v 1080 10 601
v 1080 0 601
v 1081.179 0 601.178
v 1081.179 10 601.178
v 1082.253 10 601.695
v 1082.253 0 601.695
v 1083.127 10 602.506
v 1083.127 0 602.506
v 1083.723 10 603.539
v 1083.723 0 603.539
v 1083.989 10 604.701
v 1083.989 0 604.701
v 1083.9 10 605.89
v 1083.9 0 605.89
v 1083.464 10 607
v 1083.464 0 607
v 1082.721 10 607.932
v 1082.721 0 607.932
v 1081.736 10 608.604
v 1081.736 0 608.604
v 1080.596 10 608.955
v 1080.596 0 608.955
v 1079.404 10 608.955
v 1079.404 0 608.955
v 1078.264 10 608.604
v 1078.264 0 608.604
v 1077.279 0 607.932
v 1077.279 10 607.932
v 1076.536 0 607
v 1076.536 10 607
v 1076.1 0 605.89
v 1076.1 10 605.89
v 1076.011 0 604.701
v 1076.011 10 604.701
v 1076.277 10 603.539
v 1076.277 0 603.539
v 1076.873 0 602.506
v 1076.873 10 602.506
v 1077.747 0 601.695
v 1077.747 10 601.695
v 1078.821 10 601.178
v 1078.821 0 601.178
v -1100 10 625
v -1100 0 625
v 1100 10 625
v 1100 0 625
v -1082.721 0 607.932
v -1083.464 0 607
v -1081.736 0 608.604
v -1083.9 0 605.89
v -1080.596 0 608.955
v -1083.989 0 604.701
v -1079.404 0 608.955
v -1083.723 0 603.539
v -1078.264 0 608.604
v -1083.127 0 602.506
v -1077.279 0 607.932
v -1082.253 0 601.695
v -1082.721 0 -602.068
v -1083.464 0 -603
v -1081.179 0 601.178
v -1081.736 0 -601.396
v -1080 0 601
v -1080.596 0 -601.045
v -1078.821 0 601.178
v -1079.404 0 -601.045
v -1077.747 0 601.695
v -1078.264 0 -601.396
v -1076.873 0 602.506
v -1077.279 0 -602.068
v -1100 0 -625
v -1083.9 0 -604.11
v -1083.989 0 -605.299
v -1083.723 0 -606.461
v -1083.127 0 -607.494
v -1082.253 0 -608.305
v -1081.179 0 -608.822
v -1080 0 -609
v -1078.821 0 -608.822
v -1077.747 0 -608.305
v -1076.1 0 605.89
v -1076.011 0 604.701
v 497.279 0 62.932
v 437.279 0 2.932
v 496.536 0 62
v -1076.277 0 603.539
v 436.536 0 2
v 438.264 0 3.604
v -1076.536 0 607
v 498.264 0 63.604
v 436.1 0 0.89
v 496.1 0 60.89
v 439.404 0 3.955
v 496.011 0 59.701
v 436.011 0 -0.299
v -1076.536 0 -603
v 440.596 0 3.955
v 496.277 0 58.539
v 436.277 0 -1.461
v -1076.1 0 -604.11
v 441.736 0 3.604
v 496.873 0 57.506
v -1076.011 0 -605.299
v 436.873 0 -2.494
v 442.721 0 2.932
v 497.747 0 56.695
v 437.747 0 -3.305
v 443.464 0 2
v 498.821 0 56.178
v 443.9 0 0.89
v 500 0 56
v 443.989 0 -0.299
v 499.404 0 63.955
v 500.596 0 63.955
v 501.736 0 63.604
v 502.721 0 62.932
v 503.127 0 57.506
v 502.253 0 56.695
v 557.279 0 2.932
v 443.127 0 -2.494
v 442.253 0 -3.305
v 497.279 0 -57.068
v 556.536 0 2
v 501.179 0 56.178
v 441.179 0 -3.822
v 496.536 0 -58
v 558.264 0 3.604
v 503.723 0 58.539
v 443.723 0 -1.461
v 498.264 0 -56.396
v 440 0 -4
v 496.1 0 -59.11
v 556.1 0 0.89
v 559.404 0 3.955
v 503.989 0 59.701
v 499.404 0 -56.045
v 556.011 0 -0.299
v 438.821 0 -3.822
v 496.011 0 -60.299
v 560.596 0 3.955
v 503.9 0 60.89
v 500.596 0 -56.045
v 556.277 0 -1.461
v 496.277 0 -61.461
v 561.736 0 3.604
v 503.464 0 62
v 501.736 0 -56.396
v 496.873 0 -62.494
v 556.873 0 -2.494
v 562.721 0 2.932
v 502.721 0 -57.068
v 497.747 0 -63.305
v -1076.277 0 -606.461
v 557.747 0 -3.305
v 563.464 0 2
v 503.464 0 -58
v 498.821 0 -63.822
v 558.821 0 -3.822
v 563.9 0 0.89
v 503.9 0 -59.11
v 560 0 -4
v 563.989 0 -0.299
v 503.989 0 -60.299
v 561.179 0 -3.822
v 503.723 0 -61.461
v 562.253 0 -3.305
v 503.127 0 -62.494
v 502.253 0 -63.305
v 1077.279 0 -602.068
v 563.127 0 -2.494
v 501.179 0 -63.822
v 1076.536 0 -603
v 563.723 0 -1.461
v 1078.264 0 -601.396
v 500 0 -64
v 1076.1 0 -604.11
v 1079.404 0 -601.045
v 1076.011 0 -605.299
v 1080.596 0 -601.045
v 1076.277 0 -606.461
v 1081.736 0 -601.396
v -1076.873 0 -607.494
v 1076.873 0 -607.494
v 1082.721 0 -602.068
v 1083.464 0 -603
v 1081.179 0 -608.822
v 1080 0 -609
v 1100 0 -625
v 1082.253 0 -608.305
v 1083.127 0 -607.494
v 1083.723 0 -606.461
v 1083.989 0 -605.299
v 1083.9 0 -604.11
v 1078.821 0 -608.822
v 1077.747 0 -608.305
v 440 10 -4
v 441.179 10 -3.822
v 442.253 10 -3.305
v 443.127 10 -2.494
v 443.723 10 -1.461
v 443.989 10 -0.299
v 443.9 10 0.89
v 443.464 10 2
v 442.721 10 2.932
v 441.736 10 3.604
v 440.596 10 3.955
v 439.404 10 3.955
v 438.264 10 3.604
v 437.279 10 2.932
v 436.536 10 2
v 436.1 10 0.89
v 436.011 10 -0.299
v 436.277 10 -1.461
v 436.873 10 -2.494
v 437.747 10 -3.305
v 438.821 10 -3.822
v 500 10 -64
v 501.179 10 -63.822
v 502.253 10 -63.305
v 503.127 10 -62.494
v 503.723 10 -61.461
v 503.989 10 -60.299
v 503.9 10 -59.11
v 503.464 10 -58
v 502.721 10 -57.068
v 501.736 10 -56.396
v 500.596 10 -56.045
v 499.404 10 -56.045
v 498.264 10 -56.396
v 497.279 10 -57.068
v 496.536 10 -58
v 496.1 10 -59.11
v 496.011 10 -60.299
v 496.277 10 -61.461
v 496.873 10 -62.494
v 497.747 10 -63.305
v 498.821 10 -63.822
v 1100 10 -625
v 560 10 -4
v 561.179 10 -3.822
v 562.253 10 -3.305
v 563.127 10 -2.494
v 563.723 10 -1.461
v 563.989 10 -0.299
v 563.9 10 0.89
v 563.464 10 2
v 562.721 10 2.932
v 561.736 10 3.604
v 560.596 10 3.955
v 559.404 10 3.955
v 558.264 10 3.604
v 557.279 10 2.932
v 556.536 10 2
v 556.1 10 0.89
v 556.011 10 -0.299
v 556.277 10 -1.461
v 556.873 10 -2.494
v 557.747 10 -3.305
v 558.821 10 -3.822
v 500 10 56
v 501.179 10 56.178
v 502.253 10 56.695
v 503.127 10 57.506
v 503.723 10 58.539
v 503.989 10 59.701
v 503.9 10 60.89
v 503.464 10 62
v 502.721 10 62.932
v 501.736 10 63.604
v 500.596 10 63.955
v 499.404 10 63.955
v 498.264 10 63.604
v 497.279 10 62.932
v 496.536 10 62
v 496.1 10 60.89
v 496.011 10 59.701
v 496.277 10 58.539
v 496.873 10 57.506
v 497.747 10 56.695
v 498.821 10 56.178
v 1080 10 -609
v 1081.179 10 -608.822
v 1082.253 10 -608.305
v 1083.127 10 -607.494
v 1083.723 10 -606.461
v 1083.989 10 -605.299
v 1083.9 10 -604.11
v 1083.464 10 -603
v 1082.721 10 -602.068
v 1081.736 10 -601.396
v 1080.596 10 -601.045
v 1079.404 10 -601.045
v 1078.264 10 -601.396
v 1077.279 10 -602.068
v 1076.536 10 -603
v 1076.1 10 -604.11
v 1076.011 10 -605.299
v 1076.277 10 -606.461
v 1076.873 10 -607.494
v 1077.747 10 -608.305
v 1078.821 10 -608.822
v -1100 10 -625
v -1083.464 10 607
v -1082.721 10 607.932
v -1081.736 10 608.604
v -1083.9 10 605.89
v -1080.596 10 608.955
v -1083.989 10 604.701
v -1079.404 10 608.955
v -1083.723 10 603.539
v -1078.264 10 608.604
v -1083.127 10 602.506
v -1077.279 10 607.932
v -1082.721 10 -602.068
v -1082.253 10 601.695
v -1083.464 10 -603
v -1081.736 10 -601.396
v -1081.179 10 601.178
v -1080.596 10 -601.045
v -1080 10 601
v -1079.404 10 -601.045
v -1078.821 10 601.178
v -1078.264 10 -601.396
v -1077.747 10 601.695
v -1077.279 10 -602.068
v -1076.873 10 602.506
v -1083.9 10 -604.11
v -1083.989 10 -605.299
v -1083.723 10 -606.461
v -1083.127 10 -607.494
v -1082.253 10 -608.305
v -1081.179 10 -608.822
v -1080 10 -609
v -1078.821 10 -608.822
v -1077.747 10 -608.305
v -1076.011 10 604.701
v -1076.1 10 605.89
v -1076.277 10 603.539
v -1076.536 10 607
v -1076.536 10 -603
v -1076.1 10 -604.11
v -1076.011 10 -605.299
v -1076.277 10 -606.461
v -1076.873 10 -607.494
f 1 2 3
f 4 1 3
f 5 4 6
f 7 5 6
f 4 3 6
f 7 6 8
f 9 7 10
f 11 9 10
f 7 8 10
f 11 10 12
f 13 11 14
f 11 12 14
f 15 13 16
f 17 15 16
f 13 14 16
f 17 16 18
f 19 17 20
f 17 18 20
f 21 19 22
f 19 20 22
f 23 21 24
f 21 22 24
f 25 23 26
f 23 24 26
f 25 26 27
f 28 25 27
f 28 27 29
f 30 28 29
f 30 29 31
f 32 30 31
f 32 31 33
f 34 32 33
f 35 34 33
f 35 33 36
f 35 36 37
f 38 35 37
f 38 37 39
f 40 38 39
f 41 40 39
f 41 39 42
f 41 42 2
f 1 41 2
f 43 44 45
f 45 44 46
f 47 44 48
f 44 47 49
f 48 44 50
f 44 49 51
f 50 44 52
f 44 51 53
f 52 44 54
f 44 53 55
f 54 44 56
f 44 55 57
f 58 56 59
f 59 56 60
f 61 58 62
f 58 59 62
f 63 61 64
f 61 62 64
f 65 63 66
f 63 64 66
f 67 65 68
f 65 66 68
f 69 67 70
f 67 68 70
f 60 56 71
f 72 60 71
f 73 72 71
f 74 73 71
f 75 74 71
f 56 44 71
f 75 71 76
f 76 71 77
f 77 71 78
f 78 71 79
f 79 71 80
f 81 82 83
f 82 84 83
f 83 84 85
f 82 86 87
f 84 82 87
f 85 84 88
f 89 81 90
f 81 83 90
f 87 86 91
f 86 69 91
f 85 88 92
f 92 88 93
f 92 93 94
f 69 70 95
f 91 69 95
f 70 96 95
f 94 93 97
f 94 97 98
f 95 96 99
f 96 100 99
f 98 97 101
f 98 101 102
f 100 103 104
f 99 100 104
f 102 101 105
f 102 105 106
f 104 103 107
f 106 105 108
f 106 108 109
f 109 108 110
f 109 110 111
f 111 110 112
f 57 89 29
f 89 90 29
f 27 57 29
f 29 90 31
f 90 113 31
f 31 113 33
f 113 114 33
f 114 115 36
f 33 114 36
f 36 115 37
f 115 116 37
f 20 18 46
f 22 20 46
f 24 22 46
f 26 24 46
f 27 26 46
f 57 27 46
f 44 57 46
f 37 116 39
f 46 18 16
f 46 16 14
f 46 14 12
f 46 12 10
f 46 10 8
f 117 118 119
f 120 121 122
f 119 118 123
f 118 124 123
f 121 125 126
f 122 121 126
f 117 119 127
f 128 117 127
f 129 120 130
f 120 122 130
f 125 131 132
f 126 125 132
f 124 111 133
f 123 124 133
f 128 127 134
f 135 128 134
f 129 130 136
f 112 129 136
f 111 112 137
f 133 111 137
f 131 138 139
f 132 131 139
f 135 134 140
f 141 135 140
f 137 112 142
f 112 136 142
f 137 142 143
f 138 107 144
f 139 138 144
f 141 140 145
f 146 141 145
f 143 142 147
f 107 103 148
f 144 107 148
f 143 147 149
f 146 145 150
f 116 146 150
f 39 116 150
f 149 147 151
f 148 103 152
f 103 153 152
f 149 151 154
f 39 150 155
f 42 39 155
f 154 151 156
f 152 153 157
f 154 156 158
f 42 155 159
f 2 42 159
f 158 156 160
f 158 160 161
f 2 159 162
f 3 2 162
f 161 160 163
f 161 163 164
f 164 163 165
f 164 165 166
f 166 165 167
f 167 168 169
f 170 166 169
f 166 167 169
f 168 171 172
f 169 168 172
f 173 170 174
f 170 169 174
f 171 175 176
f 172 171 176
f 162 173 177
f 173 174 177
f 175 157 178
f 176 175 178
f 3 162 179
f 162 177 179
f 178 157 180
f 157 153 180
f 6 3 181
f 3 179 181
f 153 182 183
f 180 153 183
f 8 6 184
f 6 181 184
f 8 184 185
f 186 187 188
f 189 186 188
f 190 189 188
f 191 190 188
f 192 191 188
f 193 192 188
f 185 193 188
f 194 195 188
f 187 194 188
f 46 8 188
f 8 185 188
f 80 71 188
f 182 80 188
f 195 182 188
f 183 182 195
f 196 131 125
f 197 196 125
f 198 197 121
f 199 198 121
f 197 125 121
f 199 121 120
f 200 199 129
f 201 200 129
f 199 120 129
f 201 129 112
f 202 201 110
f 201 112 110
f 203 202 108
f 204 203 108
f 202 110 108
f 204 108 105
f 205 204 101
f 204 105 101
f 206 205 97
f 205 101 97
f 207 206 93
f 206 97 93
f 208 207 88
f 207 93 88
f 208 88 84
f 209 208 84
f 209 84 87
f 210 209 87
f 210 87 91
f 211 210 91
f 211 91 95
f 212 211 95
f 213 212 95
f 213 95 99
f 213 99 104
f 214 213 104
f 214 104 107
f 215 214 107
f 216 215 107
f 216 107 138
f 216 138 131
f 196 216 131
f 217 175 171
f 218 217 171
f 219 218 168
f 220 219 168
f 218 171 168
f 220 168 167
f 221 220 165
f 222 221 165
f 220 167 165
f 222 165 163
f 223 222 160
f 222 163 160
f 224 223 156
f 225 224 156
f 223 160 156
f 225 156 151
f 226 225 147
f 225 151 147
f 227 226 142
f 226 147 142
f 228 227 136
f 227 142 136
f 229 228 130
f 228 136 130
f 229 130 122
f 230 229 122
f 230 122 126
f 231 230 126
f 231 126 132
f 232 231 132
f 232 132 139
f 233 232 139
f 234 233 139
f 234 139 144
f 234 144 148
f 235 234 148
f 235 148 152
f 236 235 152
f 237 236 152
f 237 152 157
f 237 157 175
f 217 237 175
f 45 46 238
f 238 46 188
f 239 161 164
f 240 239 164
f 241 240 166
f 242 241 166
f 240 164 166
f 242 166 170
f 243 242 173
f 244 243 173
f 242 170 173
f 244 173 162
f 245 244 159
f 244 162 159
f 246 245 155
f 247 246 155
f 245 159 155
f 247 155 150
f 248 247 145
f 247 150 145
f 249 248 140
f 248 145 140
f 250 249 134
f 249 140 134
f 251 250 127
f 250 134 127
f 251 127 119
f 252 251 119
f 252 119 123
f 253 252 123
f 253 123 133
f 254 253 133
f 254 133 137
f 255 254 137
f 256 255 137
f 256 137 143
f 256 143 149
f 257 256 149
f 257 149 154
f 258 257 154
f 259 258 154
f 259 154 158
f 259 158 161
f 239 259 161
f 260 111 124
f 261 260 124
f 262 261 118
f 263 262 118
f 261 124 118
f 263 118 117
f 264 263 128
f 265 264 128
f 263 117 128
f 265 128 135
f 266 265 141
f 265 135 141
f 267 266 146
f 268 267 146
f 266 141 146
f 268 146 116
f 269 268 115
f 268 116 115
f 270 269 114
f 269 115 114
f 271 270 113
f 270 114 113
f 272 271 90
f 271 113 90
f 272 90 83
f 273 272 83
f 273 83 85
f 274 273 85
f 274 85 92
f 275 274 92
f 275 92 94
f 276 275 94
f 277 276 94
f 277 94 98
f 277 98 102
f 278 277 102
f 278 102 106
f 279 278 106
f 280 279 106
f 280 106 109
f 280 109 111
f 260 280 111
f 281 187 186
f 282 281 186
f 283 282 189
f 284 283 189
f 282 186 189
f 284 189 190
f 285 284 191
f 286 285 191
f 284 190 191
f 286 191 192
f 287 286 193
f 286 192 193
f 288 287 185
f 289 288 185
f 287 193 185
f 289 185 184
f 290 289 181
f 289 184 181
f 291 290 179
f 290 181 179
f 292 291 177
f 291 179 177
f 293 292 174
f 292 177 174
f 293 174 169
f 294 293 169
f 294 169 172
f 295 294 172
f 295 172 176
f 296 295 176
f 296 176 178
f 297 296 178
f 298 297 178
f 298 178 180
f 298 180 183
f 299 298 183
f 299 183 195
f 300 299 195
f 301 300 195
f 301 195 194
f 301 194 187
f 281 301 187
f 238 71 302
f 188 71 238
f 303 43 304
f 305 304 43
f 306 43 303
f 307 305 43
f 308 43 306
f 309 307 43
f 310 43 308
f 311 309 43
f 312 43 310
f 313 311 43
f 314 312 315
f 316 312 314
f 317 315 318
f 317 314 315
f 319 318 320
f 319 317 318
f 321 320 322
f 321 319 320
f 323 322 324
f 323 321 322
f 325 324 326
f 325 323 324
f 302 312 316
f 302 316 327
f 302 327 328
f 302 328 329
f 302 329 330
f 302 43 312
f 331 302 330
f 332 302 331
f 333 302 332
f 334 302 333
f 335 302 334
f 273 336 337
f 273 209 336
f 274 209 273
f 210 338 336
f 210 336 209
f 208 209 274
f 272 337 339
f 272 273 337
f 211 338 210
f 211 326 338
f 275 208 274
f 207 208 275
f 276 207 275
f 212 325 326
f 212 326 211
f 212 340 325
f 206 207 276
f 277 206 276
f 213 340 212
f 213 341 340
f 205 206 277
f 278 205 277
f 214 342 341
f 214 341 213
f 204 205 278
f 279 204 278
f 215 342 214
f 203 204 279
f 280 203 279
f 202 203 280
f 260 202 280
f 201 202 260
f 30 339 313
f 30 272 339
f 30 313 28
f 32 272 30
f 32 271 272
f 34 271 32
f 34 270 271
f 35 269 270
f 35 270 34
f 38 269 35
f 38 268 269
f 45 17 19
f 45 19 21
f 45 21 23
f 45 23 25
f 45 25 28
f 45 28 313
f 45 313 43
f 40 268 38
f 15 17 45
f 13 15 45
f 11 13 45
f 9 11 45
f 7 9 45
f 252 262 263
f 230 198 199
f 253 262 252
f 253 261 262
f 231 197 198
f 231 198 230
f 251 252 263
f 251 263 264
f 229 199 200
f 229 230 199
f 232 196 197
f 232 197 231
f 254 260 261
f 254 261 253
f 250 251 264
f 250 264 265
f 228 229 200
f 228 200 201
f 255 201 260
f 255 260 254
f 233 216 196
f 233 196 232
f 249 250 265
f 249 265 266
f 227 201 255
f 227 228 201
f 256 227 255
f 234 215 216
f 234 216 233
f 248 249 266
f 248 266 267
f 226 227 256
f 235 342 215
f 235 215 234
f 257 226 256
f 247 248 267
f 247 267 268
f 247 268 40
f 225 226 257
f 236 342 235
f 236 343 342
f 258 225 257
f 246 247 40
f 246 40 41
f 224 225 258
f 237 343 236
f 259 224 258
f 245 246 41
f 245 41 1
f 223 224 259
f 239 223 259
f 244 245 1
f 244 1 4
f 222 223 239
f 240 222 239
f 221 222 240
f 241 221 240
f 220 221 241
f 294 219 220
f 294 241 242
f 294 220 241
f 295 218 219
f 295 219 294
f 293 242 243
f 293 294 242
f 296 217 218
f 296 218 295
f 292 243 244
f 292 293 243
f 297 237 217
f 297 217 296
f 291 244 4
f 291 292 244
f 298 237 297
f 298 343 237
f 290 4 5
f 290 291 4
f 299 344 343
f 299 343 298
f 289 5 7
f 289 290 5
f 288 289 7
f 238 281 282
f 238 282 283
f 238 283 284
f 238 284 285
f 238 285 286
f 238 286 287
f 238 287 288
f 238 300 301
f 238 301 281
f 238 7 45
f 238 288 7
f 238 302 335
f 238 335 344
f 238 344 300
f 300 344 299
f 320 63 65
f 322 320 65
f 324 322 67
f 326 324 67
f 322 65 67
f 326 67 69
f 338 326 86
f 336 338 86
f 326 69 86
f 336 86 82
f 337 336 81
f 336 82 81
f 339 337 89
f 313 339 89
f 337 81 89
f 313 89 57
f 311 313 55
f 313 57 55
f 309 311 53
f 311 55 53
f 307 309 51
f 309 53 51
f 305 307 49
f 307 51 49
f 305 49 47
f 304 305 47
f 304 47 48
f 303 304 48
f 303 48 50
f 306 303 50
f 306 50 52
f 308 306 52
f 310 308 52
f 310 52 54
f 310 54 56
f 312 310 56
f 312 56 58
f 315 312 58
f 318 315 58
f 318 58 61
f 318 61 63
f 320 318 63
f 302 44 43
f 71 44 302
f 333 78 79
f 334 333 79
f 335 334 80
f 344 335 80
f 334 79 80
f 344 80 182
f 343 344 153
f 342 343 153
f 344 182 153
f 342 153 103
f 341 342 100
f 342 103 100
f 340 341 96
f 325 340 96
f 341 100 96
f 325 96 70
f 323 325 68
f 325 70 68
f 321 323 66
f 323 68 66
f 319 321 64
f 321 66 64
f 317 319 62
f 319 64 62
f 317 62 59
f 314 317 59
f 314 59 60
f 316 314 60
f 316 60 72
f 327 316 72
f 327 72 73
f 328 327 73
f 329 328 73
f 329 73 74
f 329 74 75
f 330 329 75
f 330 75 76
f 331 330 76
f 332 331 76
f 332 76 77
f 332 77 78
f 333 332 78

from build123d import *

# Parameters (mm, degrees)
SKETCH_2_W      = 2200
SKETCH_2_H      = 1250
EXTRUDE_1_DEPTH = 10
MM_1_D          = 8
MM_1_DEPTH      = 20
MM_1_TIP        = 2.403442476
MM_2_D          = 8
MM_2_DEPTH      = 20
MM_2_TIP        = 2.403442476


with BuildPart() as part:
    # 草图2 → 凸台-拉伸1 (new body)
    with BuildSketch(Plane(origin=(0, 0, 0), x_dir=(1, 0, 0), z_dir=(0, 1, 0))):
        Rectangle(SKETCH_2_W, SKETCH_2_H)
    extrude(amount=EXTRUDE_1_DEPTH)

    # 大小mm 暗销孔1
    with Locations(Plane(origin=(-1080, 10, -605), x_dir=(0, 0, 1), z_dir=(0, 1, 0))):
        with Locations((0, 0), (0, 2160), (1210, 2160), (1210, 0)):
            Hole(MM_1_D / 2, depth=MM_1_DEPTH)
            with Locations((0, 0, -(MM_1_DEPTH + MM_1_TIP / 2))):  # 118° drill point
                Cone(0, MM_1_D / 2, MM_1_TIP, mode=Mode.SUBTRACT)

    # 大小mm 暗销孔2
    with Locations(Plane(origin=(500, 10, -60), x_dir=(0, 0, 1), z_dir=(0, 1, 0))):
        with Locations((0, 0), (60, -60), (120, 0), (60, 60)):
            Hole(MM_2_D / 2, depth=MM_2_DEPTH)
            with Locations((0, 0, -(MM_2_DEPTH + MM_2_TIP / 2))):  # 118° drill point
                Cone(0, MM_2_D / 2, MM_2_TIP, mode=Mode.SUBTRACT)


solid = part.part
